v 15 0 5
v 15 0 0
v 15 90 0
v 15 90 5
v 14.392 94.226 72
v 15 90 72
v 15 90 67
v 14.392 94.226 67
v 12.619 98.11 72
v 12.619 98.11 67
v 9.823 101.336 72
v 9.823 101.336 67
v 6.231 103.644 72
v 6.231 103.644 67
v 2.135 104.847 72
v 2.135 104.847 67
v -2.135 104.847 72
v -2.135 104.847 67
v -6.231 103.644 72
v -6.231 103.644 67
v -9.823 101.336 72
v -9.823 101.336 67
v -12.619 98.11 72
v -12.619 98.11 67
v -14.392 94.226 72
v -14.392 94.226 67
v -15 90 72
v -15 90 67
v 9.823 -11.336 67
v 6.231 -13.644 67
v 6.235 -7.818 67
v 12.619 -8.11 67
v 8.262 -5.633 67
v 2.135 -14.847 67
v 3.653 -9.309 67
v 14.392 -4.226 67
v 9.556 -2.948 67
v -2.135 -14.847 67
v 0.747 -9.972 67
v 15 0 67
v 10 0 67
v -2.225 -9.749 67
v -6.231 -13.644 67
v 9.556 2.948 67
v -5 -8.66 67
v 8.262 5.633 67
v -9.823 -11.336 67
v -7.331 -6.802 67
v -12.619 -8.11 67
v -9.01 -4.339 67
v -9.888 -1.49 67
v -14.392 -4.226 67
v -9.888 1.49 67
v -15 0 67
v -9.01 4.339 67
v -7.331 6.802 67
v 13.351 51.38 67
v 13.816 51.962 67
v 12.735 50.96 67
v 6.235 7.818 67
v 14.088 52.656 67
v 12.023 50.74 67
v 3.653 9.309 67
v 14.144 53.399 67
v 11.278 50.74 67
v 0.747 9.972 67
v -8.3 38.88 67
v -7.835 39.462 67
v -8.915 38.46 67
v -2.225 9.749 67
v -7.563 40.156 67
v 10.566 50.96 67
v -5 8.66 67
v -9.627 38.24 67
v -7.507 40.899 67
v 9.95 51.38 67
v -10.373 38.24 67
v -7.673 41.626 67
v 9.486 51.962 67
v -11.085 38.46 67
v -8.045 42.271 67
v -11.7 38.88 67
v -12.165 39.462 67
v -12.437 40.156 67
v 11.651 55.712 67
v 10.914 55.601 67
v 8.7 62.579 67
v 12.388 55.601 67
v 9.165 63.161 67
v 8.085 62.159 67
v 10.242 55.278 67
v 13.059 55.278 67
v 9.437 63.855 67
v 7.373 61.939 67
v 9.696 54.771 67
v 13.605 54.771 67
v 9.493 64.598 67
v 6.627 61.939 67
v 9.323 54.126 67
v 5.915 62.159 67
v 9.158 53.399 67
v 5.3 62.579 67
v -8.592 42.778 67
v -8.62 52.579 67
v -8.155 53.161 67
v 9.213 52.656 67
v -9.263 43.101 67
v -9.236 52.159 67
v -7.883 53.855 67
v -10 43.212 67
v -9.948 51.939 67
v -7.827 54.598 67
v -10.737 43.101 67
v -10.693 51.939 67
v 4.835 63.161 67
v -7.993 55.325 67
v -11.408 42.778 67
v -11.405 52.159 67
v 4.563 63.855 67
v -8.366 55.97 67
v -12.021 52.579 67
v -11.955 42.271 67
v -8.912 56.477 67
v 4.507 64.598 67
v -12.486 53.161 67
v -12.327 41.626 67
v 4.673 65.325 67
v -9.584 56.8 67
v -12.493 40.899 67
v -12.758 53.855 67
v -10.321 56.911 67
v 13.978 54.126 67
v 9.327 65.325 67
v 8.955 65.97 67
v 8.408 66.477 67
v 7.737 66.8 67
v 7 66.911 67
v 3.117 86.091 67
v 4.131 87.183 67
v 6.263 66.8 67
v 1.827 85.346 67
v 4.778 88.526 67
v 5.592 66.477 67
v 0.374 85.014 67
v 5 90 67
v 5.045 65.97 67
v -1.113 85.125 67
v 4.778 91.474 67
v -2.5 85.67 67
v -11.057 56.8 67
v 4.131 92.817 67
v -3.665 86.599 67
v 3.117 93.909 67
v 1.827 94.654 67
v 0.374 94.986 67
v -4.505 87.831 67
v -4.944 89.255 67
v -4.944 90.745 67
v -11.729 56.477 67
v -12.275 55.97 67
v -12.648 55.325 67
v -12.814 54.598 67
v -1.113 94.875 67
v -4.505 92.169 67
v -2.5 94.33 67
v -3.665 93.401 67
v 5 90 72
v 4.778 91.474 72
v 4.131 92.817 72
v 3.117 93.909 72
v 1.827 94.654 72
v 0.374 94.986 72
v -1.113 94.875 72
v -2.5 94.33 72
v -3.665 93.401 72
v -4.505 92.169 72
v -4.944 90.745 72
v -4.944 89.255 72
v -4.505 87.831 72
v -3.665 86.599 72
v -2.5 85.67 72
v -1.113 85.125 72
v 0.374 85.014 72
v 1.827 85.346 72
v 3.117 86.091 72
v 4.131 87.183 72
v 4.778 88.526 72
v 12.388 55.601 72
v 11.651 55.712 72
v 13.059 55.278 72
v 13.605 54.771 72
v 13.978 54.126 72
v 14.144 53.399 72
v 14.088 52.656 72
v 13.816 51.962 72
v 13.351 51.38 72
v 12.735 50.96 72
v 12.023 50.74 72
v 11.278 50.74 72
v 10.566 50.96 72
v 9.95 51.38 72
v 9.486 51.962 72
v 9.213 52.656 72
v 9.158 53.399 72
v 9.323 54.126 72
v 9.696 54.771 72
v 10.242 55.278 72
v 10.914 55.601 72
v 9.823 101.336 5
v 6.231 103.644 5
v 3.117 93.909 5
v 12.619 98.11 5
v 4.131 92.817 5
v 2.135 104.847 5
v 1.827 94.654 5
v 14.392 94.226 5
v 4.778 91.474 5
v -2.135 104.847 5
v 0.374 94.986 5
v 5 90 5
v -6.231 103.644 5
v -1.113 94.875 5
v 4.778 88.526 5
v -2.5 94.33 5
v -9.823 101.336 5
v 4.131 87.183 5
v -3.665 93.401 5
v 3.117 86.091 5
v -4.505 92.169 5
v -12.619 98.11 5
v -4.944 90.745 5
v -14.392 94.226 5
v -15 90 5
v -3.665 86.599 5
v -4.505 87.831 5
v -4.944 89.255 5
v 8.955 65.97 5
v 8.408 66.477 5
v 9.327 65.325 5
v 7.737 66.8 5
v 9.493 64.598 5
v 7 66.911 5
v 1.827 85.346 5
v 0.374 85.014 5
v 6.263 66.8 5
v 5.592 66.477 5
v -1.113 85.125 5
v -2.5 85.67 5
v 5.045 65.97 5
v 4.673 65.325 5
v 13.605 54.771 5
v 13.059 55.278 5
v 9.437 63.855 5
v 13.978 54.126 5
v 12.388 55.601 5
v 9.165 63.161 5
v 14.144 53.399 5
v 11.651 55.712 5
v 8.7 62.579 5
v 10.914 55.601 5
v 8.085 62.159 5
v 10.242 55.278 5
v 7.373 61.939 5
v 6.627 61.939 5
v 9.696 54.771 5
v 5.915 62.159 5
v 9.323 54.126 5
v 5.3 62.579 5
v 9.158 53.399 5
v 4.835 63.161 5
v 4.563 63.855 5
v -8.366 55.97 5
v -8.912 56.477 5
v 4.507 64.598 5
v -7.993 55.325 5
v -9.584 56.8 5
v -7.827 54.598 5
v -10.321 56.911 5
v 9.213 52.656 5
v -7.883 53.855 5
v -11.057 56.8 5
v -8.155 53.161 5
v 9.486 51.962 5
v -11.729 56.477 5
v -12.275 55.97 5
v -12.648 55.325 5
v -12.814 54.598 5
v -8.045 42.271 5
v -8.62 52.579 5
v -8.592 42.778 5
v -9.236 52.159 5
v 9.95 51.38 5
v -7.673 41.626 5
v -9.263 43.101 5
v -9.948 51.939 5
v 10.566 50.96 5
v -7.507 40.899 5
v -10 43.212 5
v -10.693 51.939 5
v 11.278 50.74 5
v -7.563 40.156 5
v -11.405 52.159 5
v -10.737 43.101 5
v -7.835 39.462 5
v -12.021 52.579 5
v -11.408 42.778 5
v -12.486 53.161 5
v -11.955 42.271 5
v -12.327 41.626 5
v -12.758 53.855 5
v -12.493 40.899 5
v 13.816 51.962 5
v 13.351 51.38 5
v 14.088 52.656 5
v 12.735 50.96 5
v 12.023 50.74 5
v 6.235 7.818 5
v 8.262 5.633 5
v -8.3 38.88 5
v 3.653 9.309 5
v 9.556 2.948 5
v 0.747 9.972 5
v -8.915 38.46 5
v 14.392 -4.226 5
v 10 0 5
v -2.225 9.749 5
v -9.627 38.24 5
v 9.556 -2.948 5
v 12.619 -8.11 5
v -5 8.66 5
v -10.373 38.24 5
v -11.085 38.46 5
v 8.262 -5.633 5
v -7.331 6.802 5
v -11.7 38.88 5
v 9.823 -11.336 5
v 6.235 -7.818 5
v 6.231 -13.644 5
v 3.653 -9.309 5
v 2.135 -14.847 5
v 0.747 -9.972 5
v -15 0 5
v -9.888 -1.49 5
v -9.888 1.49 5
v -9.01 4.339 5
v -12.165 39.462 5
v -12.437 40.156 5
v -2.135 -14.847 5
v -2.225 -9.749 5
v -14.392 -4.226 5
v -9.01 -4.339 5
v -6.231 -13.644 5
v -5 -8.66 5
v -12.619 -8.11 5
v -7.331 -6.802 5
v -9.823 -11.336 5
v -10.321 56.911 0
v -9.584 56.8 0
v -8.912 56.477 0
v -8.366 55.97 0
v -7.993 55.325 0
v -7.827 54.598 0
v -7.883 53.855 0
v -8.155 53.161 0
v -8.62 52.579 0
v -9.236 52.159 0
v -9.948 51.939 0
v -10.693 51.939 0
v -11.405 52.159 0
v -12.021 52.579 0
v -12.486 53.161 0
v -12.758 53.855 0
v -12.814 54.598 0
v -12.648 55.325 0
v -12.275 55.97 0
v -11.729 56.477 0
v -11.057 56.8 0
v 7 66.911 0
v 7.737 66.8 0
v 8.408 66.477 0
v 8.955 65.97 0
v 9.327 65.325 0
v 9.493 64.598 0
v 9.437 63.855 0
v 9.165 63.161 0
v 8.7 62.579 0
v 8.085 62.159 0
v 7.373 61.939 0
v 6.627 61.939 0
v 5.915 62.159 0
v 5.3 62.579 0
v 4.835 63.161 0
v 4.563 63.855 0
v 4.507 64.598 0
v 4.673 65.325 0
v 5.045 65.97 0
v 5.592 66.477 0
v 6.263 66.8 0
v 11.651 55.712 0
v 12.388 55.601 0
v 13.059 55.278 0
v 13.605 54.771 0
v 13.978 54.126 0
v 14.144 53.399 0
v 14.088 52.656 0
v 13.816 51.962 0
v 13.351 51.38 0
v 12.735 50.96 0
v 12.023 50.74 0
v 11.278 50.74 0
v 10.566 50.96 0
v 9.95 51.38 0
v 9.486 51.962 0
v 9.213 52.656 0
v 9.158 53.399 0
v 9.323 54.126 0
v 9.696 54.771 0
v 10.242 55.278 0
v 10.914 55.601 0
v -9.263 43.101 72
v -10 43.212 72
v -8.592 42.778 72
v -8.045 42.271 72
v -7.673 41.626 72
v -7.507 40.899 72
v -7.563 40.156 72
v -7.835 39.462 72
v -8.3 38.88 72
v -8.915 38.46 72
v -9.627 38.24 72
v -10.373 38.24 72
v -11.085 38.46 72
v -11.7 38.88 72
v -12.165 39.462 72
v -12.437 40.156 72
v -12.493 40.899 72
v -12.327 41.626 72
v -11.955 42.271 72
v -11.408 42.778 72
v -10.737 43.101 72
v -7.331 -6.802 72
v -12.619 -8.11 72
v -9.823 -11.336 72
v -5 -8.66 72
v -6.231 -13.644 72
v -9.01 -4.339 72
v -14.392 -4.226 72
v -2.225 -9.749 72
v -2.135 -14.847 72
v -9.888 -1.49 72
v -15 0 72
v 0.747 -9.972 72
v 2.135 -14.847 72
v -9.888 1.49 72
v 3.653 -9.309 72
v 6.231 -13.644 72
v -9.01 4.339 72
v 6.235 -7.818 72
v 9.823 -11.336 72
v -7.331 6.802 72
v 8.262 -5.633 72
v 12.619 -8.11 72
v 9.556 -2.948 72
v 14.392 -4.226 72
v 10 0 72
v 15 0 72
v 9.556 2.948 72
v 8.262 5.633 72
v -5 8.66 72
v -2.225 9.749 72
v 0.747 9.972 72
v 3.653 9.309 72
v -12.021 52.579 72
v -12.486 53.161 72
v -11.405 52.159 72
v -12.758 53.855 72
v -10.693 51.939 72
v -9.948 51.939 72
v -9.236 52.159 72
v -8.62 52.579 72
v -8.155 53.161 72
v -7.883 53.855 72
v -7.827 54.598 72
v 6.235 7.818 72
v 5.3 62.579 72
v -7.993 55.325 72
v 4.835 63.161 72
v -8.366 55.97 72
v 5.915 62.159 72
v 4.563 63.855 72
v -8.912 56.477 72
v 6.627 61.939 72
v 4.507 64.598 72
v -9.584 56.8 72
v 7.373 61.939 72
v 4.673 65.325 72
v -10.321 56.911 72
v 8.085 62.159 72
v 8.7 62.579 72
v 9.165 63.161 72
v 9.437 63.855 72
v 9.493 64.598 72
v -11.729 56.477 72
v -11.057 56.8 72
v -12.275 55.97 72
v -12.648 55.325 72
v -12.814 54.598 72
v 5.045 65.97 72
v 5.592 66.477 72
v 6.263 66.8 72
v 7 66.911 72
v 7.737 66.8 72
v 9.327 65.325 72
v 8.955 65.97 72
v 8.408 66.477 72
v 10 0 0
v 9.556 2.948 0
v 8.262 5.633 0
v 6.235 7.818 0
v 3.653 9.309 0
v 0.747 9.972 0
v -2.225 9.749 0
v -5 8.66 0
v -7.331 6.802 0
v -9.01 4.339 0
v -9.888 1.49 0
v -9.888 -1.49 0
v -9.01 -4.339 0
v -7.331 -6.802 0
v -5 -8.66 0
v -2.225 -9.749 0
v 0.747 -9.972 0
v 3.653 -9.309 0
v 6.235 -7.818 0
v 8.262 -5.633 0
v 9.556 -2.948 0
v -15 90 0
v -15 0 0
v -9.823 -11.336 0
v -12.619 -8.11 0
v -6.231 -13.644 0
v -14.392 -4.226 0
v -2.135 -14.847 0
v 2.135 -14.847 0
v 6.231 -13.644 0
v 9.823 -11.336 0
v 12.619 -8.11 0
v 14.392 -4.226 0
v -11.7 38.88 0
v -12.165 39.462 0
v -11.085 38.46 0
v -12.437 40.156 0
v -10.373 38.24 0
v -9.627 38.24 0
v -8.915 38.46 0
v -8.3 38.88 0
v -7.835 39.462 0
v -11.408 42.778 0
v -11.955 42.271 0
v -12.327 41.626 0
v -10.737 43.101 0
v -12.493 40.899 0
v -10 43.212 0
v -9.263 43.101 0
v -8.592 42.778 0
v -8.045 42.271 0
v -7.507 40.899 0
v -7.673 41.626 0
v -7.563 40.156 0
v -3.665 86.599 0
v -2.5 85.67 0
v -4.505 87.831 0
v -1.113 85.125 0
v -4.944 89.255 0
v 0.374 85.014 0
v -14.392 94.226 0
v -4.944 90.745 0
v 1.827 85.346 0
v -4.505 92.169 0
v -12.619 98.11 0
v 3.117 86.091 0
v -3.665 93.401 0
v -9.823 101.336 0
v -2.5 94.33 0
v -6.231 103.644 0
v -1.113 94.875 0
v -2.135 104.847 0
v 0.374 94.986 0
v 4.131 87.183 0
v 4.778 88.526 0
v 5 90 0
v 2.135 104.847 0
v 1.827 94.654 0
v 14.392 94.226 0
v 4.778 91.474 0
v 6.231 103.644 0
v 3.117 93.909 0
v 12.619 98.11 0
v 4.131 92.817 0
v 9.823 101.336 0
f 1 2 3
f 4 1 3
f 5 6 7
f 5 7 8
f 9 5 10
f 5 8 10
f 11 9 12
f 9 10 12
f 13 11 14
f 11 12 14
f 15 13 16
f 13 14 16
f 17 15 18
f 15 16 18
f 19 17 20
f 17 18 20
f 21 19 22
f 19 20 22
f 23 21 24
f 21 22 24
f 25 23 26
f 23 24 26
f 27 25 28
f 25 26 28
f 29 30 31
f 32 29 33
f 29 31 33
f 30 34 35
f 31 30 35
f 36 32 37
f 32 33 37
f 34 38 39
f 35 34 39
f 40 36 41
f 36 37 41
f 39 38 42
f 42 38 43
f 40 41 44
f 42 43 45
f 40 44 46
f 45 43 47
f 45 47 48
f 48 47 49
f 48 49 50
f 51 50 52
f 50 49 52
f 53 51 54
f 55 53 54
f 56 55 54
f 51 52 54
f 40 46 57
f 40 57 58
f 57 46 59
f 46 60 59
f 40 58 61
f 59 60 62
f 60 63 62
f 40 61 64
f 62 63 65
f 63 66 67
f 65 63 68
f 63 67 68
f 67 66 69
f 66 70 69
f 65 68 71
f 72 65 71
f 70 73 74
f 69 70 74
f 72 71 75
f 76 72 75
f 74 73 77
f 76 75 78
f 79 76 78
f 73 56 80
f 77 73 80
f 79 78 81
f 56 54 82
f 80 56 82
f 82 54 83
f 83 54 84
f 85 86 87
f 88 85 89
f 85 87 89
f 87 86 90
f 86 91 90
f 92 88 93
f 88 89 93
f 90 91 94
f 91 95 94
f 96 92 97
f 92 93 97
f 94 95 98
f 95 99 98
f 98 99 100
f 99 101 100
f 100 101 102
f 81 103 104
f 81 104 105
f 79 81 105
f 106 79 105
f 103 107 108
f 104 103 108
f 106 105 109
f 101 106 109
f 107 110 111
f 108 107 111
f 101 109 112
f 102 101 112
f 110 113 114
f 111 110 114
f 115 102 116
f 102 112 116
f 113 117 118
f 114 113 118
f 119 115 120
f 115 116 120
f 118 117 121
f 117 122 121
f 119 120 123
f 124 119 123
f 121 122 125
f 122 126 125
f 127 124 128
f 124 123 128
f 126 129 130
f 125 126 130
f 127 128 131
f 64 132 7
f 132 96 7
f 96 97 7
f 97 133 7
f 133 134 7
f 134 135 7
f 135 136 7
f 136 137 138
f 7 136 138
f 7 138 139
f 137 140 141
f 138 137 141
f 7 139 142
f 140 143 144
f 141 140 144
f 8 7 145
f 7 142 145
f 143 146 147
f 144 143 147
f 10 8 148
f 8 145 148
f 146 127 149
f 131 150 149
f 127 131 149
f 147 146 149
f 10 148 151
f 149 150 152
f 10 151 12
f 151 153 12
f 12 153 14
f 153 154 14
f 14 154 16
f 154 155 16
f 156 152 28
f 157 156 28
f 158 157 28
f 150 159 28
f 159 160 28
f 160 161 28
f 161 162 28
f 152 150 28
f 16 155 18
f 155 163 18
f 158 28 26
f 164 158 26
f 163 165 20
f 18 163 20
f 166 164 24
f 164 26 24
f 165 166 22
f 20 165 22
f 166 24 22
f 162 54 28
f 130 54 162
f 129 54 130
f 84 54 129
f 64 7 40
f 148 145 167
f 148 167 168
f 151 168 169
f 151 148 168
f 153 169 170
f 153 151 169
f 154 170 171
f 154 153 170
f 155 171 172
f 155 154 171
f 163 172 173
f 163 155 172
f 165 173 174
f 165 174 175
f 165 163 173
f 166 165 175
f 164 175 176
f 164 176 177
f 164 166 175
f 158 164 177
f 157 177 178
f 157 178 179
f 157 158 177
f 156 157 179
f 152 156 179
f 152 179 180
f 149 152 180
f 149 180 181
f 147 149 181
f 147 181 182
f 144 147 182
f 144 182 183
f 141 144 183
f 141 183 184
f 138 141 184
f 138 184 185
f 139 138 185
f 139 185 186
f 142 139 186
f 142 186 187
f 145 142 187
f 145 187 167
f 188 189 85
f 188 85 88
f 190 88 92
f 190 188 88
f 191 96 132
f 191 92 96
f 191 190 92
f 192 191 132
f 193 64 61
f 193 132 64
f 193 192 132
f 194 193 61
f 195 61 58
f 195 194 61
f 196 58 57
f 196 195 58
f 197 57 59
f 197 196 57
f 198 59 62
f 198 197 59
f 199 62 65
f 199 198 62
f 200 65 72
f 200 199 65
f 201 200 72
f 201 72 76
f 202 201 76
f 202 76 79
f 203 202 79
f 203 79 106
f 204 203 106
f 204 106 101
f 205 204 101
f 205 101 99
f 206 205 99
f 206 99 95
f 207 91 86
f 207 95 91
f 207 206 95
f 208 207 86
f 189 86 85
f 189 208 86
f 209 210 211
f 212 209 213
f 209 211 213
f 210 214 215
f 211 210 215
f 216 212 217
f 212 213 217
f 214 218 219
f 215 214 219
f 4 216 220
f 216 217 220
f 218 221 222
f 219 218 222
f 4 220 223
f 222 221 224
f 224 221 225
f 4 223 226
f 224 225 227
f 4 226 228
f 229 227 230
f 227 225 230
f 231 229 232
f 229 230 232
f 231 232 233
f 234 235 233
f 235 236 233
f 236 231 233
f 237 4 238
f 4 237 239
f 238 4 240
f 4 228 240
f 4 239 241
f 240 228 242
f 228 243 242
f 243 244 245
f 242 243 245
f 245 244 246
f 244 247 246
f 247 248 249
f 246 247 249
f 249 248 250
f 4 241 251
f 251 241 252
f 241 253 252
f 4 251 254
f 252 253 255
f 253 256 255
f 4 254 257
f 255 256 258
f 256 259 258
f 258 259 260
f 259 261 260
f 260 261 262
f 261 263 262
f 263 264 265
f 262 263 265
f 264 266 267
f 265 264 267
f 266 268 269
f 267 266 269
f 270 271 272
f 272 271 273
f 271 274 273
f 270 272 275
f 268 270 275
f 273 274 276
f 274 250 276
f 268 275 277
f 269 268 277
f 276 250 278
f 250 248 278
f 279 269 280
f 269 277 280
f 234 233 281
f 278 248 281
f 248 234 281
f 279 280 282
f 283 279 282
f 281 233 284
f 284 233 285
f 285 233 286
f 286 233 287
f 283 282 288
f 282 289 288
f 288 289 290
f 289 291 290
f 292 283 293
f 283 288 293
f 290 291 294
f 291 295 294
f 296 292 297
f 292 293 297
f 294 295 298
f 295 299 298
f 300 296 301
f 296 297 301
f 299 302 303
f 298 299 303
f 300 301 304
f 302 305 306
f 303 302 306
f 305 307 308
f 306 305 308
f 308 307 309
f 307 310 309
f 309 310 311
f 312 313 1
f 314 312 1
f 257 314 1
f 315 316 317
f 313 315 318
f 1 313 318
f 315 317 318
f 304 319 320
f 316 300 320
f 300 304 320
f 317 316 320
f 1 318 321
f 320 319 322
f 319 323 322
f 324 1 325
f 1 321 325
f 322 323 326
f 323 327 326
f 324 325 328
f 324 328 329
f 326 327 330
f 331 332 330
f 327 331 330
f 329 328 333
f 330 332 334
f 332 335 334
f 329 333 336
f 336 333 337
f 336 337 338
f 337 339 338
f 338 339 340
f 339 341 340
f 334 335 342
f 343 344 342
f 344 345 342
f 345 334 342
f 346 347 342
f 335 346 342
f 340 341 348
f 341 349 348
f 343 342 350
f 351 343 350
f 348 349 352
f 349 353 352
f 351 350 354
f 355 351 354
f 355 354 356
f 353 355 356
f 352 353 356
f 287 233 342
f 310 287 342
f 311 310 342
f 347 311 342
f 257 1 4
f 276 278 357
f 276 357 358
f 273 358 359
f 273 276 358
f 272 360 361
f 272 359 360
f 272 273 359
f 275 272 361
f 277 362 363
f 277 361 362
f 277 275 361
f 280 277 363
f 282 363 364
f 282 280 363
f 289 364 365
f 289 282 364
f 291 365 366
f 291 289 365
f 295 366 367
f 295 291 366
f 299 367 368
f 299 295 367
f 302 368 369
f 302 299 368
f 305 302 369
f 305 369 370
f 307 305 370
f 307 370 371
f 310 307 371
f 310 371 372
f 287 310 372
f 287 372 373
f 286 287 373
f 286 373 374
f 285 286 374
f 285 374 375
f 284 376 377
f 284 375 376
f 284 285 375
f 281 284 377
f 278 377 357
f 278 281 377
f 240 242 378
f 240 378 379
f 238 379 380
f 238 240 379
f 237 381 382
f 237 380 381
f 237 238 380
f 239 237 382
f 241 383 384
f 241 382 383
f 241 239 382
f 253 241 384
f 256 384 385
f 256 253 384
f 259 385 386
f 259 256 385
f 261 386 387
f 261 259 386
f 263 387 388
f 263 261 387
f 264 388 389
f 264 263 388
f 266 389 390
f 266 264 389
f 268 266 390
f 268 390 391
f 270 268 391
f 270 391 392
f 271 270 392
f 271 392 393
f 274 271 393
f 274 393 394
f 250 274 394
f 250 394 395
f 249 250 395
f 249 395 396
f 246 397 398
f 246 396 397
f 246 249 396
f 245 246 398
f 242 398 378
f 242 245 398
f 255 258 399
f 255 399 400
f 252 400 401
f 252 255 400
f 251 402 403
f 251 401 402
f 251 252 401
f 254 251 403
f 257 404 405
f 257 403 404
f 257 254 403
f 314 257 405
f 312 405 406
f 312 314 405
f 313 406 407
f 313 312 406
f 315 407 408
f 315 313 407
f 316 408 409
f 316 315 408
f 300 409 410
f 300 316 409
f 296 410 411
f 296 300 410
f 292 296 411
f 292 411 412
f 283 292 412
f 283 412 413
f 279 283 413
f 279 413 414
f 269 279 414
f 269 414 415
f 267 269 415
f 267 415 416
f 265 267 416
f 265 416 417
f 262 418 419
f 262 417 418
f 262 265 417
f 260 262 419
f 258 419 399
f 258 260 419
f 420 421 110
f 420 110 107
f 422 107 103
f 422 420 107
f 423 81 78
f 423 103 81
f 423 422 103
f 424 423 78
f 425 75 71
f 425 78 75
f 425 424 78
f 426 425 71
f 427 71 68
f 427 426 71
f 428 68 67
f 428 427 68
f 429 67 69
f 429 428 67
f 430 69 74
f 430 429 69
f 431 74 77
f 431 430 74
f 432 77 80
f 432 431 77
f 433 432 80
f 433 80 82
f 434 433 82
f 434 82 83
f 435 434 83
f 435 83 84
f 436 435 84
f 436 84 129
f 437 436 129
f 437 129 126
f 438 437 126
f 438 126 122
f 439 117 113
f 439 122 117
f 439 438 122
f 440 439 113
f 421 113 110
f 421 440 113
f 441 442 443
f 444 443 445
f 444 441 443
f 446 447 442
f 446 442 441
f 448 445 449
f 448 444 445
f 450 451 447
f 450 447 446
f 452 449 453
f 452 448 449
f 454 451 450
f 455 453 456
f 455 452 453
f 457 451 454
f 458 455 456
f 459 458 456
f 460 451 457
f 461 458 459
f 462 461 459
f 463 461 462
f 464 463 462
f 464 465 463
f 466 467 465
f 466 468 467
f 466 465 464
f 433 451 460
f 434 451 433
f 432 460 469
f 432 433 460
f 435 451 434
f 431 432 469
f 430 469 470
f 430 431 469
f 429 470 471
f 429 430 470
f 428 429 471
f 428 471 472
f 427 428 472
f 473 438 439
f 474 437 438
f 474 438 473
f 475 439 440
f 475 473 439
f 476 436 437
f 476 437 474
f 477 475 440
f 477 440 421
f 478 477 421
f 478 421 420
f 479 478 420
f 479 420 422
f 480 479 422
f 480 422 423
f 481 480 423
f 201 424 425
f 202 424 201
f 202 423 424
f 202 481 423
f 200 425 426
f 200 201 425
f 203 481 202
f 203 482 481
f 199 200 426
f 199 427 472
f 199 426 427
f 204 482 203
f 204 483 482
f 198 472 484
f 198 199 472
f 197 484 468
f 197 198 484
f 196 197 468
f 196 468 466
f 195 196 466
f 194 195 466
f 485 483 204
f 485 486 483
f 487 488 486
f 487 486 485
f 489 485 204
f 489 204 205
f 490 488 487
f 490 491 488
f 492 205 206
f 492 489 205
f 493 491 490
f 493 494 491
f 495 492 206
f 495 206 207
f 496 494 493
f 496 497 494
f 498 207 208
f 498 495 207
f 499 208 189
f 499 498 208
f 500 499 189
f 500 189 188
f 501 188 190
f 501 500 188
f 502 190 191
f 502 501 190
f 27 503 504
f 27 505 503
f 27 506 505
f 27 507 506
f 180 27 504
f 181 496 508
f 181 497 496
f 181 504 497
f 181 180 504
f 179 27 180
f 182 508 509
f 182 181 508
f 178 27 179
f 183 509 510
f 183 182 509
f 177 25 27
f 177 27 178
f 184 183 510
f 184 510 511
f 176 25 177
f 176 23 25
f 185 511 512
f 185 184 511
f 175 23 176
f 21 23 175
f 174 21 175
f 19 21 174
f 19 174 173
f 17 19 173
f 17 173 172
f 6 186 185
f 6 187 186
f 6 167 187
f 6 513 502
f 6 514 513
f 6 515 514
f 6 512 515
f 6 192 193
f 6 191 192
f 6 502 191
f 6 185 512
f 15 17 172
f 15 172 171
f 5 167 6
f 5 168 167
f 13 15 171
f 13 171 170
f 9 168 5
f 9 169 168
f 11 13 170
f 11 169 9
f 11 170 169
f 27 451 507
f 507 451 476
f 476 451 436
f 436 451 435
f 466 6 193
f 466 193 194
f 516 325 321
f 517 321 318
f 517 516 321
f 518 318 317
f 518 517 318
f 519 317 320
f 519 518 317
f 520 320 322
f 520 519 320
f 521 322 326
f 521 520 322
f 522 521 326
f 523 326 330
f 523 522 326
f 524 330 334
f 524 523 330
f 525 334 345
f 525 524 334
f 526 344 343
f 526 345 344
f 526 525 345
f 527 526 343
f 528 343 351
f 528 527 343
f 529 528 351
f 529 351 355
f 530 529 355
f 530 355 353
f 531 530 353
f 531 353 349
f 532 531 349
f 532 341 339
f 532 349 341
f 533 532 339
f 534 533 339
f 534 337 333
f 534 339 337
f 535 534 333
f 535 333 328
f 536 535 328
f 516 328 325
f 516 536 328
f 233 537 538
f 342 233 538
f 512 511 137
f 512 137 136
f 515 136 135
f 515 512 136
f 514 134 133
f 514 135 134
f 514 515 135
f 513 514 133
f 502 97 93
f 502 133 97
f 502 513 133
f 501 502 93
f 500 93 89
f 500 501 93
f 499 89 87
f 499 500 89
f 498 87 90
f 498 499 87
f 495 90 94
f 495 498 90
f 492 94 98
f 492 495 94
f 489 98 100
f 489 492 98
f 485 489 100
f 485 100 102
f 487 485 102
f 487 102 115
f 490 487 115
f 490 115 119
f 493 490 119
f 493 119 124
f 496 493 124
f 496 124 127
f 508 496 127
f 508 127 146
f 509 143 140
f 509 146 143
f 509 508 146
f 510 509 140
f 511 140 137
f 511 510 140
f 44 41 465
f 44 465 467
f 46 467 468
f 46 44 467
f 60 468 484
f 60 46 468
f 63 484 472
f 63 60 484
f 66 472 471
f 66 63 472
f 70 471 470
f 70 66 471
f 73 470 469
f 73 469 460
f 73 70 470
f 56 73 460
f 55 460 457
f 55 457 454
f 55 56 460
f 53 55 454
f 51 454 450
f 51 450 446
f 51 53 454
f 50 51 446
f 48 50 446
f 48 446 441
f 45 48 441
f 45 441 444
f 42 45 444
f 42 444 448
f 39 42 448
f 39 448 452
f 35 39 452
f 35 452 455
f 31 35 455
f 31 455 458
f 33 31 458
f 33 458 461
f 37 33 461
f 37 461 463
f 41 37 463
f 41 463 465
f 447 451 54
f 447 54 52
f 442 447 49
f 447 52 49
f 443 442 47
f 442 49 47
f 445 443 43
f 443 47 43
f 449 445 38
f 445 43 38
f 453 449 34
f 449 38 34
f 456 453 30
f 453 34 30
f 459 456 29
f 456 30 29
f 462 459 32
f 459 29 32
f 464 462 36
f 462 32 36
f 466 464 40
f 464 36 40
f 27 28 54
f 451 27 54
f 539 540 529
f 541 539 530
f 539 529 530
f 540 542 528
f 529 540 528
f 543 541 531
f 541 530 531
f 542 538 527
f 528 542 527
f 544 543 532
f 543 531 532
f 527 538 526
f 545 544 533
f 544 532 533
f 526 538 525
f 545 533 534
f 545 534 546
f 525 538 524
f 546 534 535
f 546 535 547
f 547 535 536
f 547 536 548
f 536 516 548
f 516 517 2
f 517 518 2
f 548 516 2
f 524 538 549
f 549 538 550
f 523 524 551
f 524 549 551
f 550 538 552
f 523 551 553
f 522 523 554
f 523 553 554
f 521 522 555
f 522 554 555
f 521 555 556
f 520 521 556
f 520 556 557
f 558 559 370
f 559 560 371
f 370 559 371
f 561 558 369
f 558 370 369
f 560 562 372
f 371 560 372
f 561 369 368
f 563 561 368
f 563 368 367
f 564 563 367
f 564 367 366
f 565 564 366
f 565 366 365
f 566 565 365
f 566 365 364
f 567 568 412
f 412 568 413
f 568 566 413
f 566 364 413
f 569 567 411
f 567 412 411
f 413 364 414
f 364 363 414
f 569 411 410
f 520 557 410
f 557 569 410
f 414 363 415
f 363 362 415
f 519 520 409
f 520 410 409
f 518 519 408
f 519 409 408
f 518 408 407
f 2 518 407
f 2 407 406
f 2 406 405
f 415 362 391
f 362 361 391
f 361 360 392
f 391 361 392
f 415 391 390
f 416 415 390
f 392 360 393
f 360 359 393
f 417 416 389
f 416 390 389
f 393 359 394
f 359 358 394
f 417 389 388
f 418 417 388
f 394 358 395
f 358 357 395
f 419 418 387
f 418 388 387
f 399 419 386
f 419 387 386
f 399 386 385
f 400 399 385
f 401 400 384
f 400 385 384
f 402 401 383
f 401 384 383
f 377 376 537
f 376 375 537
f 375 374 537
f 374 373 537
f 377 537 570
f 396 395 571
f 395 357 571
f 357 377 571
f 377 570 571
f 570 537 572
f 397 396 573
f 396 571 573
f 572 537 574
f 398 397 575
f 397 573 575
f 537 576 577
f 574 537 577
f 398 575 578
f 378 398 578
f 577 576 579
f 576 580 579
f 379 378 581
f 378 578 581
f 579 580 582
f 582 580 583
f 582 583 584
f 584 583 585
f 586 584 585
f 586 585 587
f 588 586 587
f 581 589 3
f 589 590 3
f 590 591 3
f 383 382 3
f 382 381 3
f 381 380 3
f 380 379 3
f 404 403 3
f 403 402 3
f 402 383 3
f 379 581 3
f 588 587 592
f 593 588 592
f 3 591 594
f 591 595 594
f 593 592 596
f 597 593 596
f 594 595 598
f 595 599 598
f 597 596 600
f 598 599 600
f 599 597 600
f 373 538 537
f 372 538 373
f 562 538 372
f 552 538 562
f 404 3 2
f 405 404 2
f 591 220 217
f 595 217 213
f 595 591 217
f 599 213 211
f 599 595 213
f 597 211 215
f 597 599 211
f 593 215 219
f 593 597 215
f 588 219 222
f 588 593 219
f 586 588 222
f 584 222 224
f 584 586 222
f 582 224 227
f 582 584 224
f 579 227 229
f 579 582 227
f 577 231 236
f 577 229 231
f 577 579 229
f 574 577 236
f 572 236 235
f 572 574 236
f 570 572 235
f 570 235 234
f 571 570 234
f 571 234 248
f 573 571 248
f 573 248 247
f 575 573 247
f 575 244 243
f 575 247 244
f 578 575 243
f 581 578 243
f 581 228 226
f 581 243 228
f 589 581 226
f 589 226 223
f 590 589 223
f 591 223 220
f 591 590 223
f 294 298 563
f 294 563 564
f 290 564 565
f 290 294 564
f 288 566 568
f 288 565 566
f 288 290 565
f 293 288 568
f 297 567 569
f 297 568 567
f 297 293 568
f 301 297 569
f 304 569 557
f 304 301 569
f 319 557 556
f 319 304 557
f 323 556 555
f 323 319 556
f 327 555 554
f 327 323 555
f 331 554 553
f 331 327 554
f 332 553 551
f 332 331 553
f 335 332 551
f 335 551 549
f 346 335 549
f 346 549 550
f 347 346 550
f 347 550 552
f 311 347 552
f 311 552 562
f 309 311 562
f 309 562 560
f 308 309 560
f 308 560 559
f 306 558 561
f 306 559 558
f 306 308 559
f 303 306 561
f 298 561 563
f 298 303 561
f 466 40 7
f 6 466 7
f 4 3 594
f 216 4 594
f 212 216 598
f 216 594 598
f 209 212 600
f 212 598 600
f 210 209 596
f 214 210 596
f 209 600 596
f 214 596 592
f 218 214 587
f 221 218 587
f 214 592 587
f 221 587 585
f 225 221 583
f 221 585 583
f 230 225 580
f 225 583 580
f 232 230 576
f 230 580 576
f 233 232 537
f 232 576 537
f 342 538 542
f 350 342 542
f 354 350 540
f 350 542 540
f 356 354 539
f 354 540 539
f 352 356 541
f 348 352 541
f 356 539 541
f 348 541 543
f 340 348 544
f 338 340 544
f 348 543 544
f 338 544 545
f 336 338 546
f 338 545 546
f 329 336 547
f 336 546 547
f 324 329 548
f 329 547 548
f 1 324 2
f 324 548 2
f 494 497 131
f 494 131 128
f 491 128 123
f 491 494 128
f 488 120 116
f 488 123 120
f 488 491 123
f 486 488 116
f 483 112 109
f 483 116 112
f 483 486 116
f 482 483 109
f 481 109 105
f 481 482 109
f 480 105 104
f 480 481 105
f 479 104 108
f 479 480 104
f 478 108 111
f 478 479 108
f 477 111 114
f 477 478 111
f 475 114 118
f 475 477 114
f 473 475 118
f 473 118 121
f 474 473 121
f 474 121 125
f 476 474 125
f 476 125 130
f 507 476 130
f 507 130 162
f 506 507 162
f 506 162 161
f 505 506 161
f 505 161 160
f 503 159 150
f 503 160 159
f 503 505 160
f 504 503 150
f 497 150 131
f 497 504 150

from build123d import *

# Parameters (mm, degrees)
SKETCH_1_R               = 10
SKETCH_1_R_2             = 5
EXTRUDE_1_DEPTH          = 72
SKETCH_2_W               = 62
SKETCH_2_H               = 70
SKETCH_2_H_2             = 67.94057246
CUT_EXTRUDE_1_DEPTH      = 70
EXTRUDE_2_DEPTH          = 62
EXTRUDE_3_DEPTH          = 62
CUT_EXTRUDE_3_DEPTH      = 130.811063026
CUT_EXTRUDE_3_DEPTH_BACK = 130.811063026
SKETCH_6_R               = 2.5
CUT_EXTRUDE_4_DEPTH      = 136.359998088
CUT_EXTRUDE_4_DEPTH_BACK = 136.359998088
SKETCH_7_W               = 62
SKETCH_7_H               = 120


with BuildPart() as part:
    # 草图1 → 凸台-拉伸1 (new body)
    with BuildSketch(Plane.XY):
        with BuildLine():
            Line((-15, 90), (-15, 0))
            ThreePointArc((-15, 0), (0, -15), (15, 0))
            Line((15, 0), (15, 90))
            ThreePointArc((15, 90), (0, 105), (-15, 90))
        make_face()
        Circle(SKETCH_1_R, mode=Mode.SUBTRACT)
        with Locations((0, 90)):
            Circle(SKETCH_1_R_2, mode=Mode.SUBTRACT)
    extrude(amount=EXTRUDE_1_DEPTH)

    # 草图2 → 切除-拉伸1 (cut)
    with BuildSketch(Plane.ZY.offset(15)):
        with Locations((36, 80)):
            Rectangle(SKETCH_2_W, SKETCH_2_H)
        with Locations((36, 11.02971377)):
            Rectangle(SKETCH_2_W, SKETCH_2_H_2)
    extrude(amount=-CUT_EXTRUDE_1_DEPTH, mode=Mode.SUBTRACT)


with BuildPart() as cut_extrude_1_piece_1:
    # of the separate pieces the step leaves, piece 1, a body of its own (cut_extrude_1_pieces)
    add(part.part.solids().sort_by_distance((15, 0, 0))[0])



with BuildPart() as cut_extrude_1_piece_2:
    # of the separate pieces the step leaves, piece 2, a body of its own (cut_extrude_1_pieces)
    add(part.part.solids().sort_by_distance((15, 0, 67))[0])


with BuildPart() as cut_extrude_1_piece_1_1:
    add(cut_extrude_1_piece_1.part)

    add(cut_extrude_1_piece_2.part)  # 凸台-拉伸2 merges 切除-拉伸1 piece 2
    # 草图4 → 凸台-拉伸2 (add)
    with BuildSketch(Plane(origin=(0, 0, 67), x_dir=(-1, 0, 0), z_dir=(0, 0, -1))):
        with BuildLine():
            Line((-4.490156776, 68.758657712), (15, 57.50601045))
            Line((15, 57.50601045), (36.319312502, 12.911360415))
            ThreePointArc((36.319312502, 12.911360415), (35.142094618, 9.577570071), (31.808304274, 10.754787955))
            Line((31.808304274, 10.754787955), (15, 45.913541163))
            Line((15, 45.913541163), (-9.509843224, 60.064305746))
            ThreePointArc((-9.509843224, 60.064305746), (-11.347175983, 66.921324953), (-4.490156776, 68.758657712))
        make_face()
    extrude(amount=EXTRUDE_2_DEPTH)

    # 草图5 → 凸台-拉伸3 (add)
    with BuildSketch(Plane(origin=(0, 0, 67), x_dir=(-1, 0, 0), z_dir=(0, 0, -1))):
        with BuildLine():
            Line((-30.017605928, 49.094069219), (-15, 60.919508718))
            Line((-15, 60.919508718), (12.5, 45.042376315))
            ThreePointArc((12.5, 45.042376315), (14.330127019, 38.212249296), (7.5, 36.382122277))
            Line((7.5, 36.382122277), (-15, 49.372503334))
            Line((-15, 49.372503334), (-27.615908762, 44.780688066))
            ThreePointArc((-27.615908762, 44.780688066), (-30.655195979, 45.913733224), (-30.017605928, 49.094069219))
        make_face()
    extrude(amount=EXTRUDE_3_DEPTH)

    # 草图6 → 切除-拉伸3 (cut, two sides: drawn at the far end of the back side and taken through both)
    with BuildSketch(Plane(origin=(0, 0, 67), x_dir=(-1, 0, 0), z_dir=(0, 0, -1)).offset(-CUT_EXTRUDE_3_DEPTH_BACK)):
        with Locations(Location((-7, 64.411481729, 0), (0, 0, 90))):
            Circle(SKETCH_6_R)
        with Locations(Location((-11.650635095, 53.212249296, 0), (0, 0, 90))):
            Circle(SKETCH_6_R)
        with Locations(Location((10, 40.712249296, 0), (0, 0, 90))):
            Circle(SKETCH_6_R)
        with Locations(Location((10.320508076, 54.411481729, 0), (0, 0, 90))):
            Circle(SKETCH_6_R)
    extrude(amount=CUT_EXTRUDE_3_DEPTH + CUT_EXTRUDE_3_DEPTH_BACK, mode=Mode.SUBTRACT)

    # 草图7 → 切除-拉伸4 (cut, two sides: drawn at the far end of the back side and taken through both)
    with BuildSketch(Plane.ZY.offset(15).offset(-CUT_EXTRUDE_4_DEPTH_BACK)):
        with Locations((36, 45)):
            Rectangle(SKETCH_7_W, SKETCH_7_H)
    extrude(amount=CUT_EXTRUDE_4_DEPTH + CUT_EXTRUDE_4_DEPTH_BACK, mode=Mode.SUBTRACT)


with BuildPart() as cut_extrude_4_piece_1:
    # of the separate pieces the step leaves, piece 1, a body of its own (cut_extrude_4_pieces)
    add(cut_extrude_1_piece_1_1.part.solids().sort_by_distance((-15, 90, 5))[0])


with BuildPart() as cut_extrude_4_piece_2:
    # of the separate pieces the step leaves, piece 2, a body of its own (cut_extrude_4_pieces)
    add(cut_extrude_1_piece_1_1.part.solids().sort_by_distance((15, 0, 67))[0])


solid = Compound([cut_extrude_4_piece_1.part, cut_extrude_4_piece_2.part])
